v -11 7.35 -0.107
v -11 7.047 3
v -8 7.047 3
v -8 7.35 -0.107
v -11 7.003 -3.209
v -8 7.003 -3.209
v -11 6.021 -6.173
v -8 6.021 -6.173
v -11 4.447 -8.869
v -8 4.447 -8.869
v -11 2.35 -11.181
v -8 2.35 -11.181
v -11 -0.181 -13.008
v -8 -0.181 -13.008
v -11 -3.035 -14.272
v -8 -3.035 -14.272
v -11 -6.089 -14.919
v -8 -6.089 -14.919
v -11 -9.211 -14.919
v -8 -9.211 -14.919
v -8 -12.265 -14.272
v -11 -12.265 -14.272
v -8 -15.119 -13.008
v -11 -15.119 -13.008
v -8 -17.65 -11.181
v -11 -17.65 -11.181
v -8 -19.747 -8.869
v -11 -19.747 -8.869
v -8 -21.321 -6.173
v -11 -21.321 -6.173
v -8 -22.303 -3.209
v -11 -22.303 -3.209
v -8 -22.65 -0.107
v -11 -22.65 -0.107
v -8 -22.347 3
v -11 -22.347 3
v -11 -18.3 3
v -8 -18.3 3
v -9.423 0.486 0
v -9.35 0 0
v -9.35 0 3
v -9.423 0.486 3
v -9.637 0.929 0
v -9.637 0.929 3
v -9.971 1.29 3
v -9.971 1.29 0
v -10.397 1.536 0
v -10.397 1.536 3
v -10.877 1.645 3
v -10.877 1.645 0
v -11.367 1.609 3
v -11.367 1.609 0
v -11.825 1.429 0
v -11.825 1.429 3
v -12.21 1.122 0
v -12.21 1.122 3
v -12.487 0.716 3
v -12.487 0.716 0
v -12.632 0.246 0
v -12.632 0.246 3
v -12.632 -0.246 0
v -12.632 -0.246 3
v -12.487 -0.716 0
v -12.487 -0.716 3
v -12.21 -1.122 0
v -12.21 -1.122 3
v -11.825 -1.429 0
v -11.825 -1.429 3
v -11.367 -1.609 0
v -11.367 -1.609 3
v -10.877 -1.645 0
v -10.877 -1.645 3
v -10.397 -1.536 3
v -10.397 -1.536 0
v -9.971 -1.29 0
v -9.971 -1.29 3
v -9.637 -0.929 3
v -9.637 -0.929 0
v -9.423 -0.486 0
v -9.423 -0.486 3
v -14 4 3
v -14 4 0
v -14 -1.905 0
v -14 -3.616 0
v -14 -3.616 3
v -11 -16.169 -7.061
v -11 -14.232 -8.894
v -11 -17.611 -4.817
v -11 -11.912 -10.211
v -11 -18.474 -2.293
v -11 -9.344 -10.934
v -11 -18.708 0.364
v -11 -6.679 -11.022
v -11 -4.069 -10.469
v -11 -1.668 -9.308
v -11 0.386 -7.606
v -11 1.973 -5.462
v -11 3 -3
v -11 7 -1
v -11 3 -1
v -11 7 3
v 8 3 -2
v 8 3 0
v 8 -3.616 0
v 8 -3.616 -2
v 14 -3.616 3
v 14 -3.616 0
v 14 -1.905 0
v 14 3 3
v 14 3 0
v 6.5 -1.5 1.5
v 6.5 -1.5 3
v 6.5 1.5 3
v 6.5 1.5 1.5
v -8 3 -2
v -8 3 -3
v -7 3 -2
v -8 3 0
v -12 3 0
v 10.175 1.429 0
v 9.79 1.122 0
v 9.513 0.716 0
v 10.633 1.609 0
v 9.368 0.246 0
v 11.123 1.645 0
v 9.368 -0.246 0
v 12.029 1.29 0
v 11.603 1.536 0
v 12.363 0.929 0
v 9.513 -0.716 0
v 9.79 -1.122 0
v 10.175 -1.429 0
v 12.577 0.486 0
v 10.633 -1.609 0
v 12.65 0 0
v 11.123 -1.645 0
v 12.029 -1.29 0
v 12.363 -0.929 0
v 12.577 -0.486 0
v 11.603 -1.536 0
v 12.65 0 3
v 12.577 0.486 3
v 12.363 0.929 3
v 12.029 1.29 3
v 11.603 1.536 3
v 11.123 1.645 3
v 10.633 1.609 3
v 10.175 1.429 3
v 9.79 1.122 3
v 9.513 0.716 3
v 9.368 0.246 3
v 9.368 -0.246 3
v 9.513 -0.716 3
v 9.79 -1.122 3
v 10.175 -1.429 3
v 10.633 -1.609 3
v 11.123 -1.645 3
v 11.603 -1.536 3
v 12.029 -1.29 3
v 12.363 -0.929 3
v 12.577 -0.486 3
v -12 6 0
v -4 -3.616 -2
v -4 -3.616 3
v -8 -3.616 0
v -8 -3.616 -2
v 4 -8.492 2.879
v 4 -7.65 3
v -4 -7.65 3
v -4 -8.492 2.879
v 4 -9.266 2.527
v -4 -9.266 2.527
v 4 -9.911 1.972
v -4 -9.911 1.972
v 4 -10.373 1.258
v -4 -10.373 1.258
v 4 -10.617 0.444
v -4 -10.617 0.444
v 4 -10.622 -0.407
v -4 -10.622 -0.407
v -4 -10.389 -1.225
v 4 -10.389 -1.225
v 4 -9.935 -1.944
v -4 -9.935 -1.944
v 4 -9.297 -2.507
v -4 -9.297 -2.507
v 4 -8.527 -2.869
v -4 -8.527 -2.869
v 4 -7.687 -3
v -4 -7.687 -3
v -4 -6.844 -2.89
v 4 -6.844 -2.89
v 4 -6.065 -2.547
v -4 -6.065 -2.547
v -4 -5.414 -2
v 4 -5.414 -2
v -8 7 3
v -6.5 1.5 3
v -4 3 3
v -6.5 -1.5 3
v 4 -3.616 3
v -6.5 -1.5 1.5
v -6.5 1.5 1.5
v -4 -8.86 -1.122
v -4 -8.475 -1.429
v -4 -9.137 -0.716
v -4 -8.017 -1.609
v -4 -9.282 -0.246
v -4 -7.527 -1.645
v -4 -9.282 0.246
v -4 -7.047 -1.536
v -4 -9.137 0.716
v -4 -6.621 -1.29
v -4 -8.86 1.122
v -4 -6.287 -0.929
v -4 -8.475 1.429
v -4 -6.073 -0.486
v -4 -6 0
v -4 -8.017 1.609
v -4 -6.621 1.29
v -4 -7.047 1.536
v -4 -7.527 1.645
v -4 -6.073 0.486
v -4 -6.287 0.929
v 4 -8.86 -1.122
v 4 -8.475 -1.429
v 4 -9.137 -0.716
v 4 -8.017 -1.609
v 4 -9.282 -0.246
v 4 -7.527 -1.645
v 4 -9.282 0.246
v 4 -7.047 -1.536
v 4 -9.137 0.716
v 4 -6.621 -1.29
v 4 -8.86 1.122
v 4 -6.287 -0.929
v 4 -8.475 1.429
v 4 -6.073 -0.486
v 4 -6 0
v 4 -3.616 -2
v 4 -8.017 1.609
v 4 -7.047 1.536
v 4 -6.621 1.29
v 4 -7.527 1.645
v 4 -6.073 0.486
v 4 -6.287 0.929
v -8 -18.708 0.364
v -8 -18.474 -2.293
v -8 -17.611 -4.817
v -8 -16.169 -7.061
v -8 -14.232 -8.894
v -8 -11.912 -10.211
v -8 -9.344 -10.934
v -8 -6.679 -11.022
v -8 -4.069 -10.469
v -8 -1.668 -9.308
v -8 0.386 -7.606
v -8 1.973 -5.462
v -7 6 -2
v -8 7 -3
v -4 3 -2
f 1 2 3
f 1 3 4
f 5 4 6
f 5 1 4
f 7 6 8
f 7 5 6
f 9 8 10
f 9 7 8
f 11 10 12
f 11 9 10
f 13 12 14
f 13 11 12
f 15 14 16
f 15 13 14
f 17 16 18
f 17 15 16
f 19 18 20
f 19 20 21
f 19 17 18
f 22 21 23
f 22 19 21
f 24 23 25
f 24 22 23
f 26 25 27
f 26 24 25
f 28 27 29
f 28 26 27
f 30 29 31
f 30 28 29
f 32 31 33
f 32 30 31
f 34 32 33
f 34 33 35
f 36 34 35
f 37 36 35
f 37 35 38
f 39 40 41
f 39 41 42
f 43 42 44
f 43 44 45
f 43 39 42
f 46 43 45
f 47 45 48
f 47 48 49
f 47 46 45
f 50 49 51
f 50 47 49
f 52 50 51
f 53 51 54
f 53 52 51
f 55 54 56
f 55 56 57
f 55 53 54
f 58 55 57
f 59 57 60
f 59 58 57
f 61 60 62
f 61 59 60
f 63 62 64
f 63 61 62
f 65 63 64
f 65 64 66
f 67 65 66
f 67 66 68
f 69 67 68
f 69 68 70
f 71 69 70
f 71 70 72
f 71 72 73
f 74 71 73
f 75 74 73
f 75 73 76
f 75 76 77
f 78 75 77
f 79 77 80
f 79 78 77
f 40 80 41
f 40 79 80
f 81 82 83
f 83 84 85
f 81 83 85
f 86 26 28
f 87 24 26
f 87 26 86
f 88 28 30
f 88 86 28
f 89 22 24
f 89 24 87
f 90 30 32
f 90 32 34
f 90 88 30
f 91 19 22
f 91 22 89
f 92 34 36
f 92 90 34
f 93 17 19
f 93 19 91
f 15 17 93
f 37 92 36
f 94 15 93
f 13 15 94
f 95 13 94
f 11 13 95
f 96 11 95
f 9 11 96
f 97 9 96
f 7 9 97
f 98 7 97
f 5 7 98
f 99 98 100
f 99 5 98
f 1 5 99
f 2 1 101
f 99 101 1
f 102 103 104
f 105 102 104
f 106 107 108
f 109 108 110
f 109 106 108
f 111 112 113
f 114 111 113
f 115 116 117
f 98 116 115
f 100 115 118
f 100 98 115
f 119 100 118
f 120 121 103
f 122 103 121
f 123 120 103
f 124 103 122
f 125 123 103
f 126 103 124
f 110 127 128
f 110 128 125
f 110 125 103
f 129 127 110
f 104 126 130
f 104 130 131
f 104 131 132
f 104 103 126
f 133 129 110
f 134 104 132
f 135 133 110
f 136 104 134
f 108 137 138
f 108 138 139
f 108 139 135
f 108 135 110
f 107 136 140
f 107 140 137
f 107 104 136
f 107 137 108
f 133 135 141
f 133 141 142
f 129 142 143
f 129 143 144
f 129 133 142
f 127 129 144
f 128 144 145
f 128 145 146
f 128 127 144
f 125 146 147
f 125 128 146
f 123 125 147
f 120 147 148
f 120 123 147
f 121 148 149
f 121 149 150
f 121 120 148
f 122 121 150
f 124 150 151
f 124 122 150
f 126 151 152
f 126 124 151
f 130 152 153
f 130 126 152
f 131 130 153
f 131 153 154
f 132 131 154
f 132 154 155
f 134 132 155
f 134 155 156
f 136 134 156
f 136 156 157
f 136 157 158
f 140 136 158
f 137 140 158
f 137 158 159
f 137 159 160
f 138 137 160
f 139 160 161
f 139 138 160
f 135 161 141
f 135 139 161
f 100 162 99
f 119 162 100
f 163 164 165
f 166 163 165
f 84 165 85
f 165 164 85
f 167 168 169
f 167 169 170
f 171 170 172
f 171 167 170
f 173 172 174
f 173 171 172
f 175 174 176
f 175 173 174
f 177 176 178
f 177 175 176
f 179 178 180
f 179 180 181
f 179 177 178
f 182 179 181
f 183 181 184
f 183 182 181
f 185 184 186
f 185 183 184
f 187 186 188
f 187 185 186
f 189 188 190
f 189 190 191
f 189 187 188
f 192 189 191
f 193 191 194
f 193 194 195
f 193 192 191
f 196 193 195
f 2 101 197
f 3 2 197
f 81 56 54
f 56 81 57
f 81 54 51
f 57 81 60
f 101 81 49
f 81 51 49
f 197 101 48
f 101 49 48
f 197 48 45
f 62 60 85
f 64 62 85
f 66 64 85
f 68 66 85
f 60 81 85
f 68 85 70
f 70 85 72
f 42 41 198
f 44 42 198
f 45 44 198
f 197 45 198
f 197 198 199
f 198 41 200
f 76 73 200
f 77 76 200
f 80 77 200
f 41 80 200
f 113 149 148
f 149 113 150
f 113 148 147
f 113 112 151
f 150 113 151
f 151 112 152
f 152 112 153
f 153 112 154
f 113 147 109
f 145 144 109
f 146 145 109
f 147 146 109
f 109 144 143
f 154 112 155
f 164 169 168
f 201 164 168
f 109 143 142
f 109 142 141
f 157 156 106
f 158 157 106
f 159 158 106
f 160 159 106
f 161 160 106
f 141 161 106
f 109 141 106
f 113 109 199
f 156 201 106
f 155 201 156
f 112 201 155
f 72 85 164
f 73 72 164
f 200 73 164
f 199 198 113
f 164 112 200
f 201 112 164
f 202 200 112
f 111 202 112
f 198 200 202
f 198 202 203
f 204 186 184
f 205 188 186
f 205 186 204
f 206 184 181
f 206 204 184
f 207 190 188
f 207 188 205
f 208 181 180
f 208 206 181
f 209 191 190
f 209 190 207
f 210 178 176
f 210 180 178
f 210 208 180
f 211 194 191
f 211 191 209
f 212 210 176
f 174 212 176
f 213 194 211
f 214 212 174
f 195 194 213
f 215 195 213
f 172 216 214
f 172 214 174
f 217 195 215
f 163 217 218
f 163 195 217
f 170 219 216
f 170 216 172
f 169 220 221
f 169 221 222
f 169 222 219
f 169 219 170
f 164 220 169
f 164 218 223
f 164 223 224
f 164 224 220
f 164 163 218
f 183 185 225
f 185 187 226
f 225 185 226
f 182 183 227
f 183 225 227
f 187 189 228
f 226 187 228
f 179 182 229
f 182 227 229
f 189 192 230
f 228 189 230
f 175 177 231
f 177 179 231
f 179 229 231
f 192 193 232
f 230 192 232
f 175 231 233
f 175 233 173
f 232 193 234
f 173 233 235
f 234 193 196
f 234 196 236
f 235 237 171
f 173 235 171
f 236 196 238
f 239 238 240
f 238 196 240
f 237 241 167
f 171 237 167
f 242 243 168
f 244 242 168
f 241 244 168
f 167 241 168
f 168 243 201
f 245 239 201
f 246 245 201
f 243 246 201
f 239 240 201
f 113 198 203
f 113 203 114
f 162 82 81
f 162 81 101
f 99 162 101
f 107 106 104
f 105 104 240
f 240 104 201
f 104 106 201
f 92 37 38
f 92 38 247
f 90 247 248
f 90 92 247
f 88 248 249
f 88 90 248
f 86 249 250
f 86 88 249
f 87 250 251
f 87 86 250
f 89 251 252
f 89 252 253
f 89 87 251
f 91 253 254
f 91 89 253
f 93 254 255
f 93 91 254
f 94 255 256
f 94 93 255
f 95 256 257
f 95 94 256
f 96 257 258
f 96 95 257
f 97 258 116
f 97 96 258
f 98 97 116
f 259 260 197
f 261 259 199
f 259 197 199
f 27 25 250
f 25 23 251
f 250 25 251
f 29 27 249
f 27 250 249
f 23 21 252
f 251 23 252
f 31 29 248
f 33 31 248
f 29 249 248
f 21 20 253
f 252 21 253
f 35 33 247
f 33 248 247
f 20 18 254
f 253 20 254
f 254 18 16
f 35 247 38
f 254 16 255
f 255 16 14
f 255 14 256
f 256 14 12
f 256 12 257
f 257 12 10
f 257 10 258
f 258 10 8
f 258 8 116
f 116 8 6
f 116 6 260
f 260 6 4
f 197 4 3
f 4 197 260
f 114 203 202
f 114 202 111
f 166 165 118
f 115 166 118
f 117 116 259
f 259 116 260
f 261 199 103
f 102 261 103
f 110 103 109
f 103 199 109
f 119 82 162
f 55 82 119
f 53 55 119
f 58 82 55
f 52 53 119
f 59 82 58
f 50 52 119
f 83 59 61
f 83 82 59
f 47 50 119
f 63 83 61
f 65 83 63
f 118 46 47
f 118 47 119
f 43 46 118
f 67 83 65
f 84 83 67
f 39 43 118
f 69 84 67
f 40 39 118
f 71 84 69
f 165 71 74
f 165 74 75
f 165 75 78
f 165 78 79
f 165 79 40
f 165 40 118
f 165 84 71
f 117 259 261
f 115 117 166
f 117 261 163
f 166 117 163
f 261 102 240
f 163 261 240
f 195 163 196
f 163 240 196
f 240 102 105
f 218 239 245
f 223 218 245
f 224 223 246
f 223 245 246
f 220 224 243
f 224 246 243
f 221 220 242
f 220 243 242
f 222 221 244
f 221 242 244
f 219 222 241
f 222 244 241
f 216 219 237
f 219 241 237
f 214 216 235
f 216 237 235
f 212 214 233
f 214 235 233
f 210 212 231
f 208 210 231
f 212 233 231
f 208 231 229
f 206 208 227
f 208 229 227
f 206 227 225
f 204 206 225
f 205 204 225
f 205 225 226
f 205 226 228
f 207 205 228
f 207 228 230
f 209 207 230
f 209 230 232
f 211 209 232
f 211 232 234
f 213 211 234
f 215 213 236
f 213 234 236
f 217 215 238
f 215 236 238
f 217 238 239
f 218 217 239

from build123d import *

# Parameters (mm, degrees)
SZKIC1_W                    = 28
SZKIC1_H                    = 6
SZKIC1_R                    = 1.65
DODANIE_WYCI_GNI_CIE1_DEPTH = 3
SZKIC2_W                    = 28
SZKIC2_H                    = 3
DODANIE_WYCI_GNI_CIE2_DEPTH = 3
SZKIC3_R                    = 1.65
DODANIE_WYCI_GNI_CIE4_DEPTH = 28
WYTNIJ_WYCI_GNI_CIE2_DEPTH  = 10
SFAZOWANIE1_START           = -14
SFAZOWANIE1_DEPTH           = 28
SFAZOWANIE1_START_2         = -4
SFAZOWANIE1_2_DEPTH         = 8
SZKIC5_W                    = 0.893182681
SZKIC5_H                    = 1.710314622
WYTNIJ_WYCI_GNI_CIE3_DEPTH  = 10
SZKIC6_W                    = 13
SZKIC6_H                    = 3
WYTNIJ_WYCI_GNI_CIE4_DEPTH  = 1.5
DODANIE_WYCI_GNI_CIE5_DEPTH = 6
SZKIC9_R                    = 15
WYTNIJ_WYCI_GNI_CIE5_DEPTH  = 3
SFAZOWANIE2_SIZE            = 4
SFAZOWANIE3_SIZE            = 4
DODANIE_WYCI_GNI_CIE6_DEPTH = 2
SFAZOWANIE4_SIZE            = 1
SFAZOWANIE5_SIZE            = 1
DODANIE_WYCI_GNI_CIE7_DEPTH = 8


with BuildPart() as part:
    # Szkic1 → Dodanie-wyciągnięcie1 (new body)
    with BuildSketch(Plane.XY):
        Rectangle(SZKIC1_W, SZKIC1_H)
        with Locations((11, 0)):
            Circle(SZKIC1_R, mode=Mode.SUBTRACT)
        with Locations((-11, 0)):
            Circle(SZKIC1_R, mode=Mode.SUBTRACT)
    extrude(amount=DODANIE_WYCI_GNI_CIE1_DEPTH)

    # Szkic2 → Dodanie-wyciągnięcie2 (add)
    with BuildSketch(Plane.XZ.offset(3)):
        with Locations((0, 1.5)):
            Rectangle(SZKIC2_W, SZKIC2_H)
    extrude(amount=DODANIE_WYCI_GNI_CIE2_DEPTH)

    # Szkic3 → Dodanie-wyciągnięcie4 (add)
    with BuildSketch(Plane(origin=(14, 0, 0), x_dir=(0, 0, -1), z_dir=(1, 0, 0))):
        with BuildLine():
            Line((0, -4.65), (-3, -4.65))
            Line((-3, -4.65), (-3, -7.65))
            ThreePointArc((-3, -7.65), (2.121320344, -9.771320344), (0, -4.65))
        make_face()
        with Locations(Location((0, -7.65, 0), (0, 0, 90))):
            Circle(SZKIC3_R, mode=Mode.SUBTRACT)
    extrude(amount=-DODANIE_WYCI_GNI_CIE4_DEPTH)

    # Szkic4 → Wytnij-wyciągnięcie2 (cut)
    with BuildSketch(Plane.ZY.offset(14)):
        Polygon((-3.162330393, -4.65), (-3.162330393, -3.615751975), (3, -3.615751975), (3, -4.65), (3, -10.796501094), (-3.162330393, -10.796501094), align=None)
    wytnij_wyci_gni_cie2 = extrude(amount=-WYTNIJ_WYCI_GNI_CIE2_DEPTH, mode=Mode.SUBTRACT)

    # Lustro1: Wytnij-wyciągnięcie2 across plane
    add(wytnij_wyci_gni_cie2.mirror(Plane(origin=(0, 0, 0), x_dir=(0, 0, 1), z_dir=(1, 0, 0))), mode=Mode.SUBTRACT)

    # Sfazowanie1: read off the stored shape, not the designer's step
    # Sfazowanie1 outline → Sfazowanie1 (add)
    with BuildSketch(Plane.YZ.offset(SFAZOWANIE1_START)):
        Polygon((-3.615751975, 0), (-3.615751975, -0.893182681), (-1.905437353, 0), align=None)
    extrude(amount=SFAZOWANIE1_DEPTH)

    # Sfazowanie1 2 outline → Sfazowanie1 2 (add)
    with BuildSketch(Plane.YZ.offset(SFAZOWANIE1_START_2)):
        with BuildLine():
            Line((-5.18804458, -1.714285714), (-3.615751975, -0.893182681))
            Line((-3.615751975, -0.893182681), (-3.615751975, 0))
            Line((-3.615751975, 0), (-4.65, 0))
            ThreePointArc((-4.65, 0), (-4.787669982, -0.898369005), (-5.18804458, -1.714285714))
        make_face()
    extrude(amount=SFAZOWANIE1_2_DEPTH)

    # Szkic5 → Wytnij-wyciągnięcie3 (cut)
    with BuildSketch(Plane(origin=(14, 0, 0), x_dir=(0, 0, -1), z_dir=(1, 0, 0))):
        with Locations((0.446591341, -2.760594664)):
            Rectangle(SZKIC5_W, SZKIC5_H)
    wytnij_wyci_gni_cie3 = extrude(amount=-WYTNIJ_WYCI_GNI_CIE3_DEPTH, mode=Mode.SUBTRACT)

    # Lustro2: Wytnij-wyciągnięcie3 across plane
    add(wytnij_wyci_gni_cie3.mirror(Plane(origin=(0, 0, 0), x_dir=(0, 0, 1), z_dir=(1, 0, 0))), mode=Mode.SUBTRACT)

    # Szkic6 → Wytnij-wyciągnięcie4 (cut)
    with BuildSketch(Plane.XY.offset(3)):
        Rectangle(SZKIC6_W, SZKIC6_H)
    extrude(amount=-WYTNIJ_WYCI_GNI_CIE4_DEPTH, mode=Mode.SUBTRACT)

    # Szkic8 → Dodanie-wyciągnięcie5 (add)
    with BuildSketch(Plane.ZY.offset(14)):
        with BuildLine():
            Line((3, 3), (3, 7.046938457))
            ThreePointArc((3, 7.046938457), (-15, -7.65), (3, -22.346938457))
            Line((3, -22.346938457), (3, -18.3))
            ThreePointArc((3, -18.3), (-10.65, -10.65), (-3, 3))
            Line((-3, 3), (0, 3))
            Line((0, 3), (3, 3))
        make_face()
    extrude(amount=-DODANIE_WYCI_GNI_CIE5_DEPTH)

    # Szkic9 → Wytnij-wyciągnięcie5 (cut)
    with BuildSketch(Plane.ZY.offset(14)):
        with Locations((0, -7.65)):
            Circle(SZKIC9_R)
        with BuildLine():
            Line((-3, 3), (3, 3))
            ThreePointArc((3, 3), (0, -18.714470164), (-3, 3))
        make_face(mode=Mode.SUBTRACT)
    extrude(amount=-WYTNIJ_WYCI_GNI_CIE5_DEPTH, mode=Mode.SUBTRACT)

    # Sfazowanie2
    sfazowanie2_edges = [part.edges().sort_by_distance(p)[0] for p in [
        (-8, 3, 1.5),
    ]]
    chamfer(sfazowanie2_edges, length=SFAZOWANIE2_SIZE)

    # Sfazowanie3
    # the kernel refuses this chamfer: 4 mm, written as the material it adds along each edge
    with BuildSketch(Plane(origin=(-11, 3, 0), x_dir=(-1, 0, 0), z_dir=(0, 0, 1))) as sfazowanie3_piece_1_section:
        Polygon((SFAZOWANIE3_SIZE, 0), (0, -SFAZOWANIE3_SIZE), (0, 0), align=None)
    sfazowanie3_piece_1 = extrude(amount=3, mode=Mode.PRIVATE)
    sfazowanie3_piece_1 = split(sfazowanie3_piece_1, bisect_by=Plane(origin=(-14, 3, 0), z_dir=(1, 0, 0)), keep=Keep.TOP, mode=Mode.PRIVATE)
    add(sfazowanie3_piece_1)

    # Szkic10 → Dodanie-wyciągnięcie6 (add)
    with BuildSketch(Plane(origin=(0, 0, 0), x_dir=(-1, 0, 0), z_dir=(0, 0, -1))):
        Polygon((-8, 3), (-8, -3.615751975), (8, -3.615751975), (8, 3.615751975), (8, 7), (4, 3), align=None)
    extrude(amount=DODANIE_WYCI_GNI_CIE6_DEPTH)

    # Sfazowanie4
    sfazowanie4_edges = [part.edges().sort_by_distance(p)[0] for p in [
        (-8, 5, -2),
    ]]
    chamfer(sfazowanie4_edges, length=SFAZOWANIE4_SIZE)

    # Sfazowanie5
    sfazowanie5_edges = [part.edges().sort_by_distance(p)[0] for p in [
        (-11, 5, 0),
    ]]
    chamfer(sfazowanie5_edges, length=SFAZOWANIE5_SIZE)

    # Szkic11 → Dodanie-wyciągnięcie7 (add)
    with BuildSketch(Plane(origin=(4, 0, 0), x_dir=(0, 0, -1), z_dir=(1, 0, 0))):
        Polygon((2, -3.615751975), (2, -5.632292806), (0.35679852, -3.615751975), align=None)
    extrude(amount=-DODANIE_WYCI_GNI_CIE7_DEPTH)


solid = part.part
